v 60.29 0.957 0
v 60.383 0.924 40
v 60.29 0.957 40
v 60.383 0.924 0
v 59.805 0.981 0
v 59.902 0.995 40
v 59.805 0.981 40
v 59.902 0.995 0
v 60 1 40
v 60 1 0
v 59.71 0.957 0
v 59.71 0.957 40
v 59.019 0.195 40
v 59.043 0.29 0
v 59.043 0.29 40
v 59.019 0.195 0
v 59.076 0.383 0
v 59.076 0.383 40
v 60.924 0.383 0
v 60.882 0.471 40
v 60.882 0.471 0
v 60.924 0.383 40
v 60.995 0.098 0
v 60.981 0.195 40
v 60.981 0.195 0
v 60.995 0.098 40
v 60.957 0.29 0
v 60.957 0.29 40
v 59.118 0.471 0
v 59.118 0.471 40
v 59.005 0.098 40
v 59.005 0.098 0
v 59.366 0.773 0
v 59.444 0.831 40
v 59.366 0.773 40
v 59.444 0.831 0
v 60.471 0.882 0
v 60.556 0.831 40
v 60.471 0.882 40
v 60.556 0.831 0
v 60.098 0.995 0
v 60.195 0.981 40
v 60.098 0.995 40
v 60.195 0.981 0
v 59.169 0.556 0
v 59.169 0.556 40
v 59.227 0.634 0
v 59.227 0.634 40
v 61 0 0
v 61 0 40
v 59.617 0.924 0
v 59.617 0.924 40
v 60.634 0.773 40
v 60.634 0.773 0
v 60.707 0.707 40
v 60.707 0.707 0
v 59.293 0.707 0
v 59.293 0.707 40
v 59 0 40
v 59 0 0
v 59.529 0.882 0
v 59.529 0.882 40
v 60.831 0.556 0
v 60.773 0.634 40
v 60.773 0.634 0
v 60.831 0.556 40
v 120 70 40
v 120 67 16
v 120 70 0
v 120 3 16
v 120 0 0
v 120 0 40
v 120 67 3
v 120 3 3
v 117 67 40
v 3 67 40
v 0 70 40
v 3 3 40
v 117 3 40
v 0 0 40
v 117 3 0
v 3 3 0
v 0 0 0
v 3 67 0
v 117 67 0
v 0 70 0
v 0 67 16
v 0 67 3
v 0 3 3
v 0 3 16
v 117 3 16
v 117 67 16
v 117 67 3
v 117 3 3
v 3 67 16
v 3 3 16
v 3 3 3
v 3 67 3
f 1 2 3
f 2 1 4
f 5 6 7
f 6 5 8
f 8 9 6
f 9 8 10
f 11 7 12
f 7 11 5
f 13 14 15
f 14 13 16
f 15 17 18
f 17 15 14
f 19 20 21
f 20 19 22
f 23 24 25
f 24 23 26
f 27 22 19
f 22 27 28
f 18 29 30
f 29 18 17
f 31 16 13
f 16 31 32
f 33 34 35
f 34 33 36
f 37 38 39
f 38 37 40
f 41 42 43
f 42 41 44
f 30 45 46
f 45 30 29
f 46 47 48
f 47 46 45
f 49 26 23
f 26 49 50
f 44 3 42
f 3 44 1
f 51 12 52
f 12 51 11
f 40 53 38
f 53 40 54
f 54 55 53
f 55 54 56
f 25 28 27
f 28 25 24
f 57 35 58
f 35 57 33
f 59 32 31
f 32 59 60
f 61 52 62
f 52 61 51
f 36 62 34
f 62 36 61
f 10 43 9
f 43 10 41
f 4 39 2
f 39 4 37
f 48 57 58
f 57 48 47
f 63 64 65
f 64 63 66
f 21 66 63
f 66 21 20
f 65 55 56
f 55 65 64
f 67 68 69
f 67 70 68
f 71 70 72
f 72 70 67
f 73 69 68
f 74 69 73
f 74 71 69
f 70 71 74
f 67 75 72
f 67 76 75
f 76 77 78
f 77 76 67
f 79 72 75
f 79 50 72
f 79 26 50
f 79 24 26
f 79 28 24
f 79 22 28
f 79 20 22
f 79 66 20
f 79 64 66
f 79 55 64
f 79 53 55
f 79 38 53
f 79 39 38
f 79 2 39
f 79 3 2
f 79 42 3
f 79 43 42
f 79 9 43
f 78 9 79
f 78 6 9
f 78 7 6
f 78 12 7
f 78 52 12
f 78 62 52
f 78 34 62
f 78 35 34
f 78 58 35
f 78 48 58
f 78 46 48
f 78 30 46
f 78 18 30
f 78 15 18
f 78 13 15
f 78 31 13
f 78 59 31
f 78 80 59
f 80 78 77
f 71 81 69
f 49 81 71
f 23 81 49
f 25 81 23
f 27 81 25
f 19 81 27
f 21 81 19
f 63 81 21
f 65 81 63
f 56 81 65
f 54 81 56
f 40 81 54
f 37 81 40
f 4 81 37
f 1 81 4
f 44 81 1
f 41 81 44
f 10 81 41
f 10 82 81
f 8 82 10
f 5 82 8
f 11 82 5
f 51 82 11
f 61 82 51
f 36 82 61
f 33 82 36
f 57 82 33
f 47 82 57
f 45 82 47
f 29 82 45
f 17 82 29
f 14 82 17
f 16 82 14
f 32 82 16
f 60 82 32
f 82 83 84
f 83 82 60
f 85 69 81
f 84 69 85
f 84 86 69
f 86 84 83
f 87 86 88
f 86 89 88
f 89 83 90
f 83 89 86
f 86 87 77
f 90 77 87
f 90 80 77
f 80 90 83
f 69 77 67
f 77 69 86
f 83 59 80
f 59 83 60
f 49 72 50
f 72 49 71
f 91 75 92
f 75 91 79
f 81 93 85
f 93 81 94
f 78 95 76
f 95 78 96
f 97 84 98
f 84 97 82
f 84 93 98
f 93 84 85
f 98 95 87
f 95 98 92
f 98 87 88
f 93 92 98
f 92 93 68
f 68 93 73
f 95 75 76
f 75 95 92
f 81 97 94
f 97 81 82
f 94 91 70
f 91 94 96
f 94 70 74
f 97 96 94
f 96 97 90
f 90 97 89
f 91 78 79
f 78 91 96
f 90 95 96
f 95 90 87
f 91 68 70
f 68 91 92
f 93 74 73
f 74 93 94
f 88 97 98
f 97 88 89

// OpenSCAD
// Buffer tank for a mini horizontal gel-electrophoresis box. Open-top rectangular tank with a
// solid raised platform in the middle that divides the bottom into two buffer chambers. Each end
// wall has a horizontal 2 mm hole along X for electrode wires. NOVEL general part.
//

Lx = 120;
Wy = 70;
H  = 40;
w  = 3;
fl = 3;

$fn = 64;

ilx = Lx - 2 * w;
iy  = Wy - 2 * w;
ih  = H - fl;

difference() {
    cube([Lx, Wy, H]);
    translate([w, w, fl]) cube([ilx, iy, H - fl]);     // inner cavity
    translate([w, w, 0]) cube([ilx, iy, fl]);         // floor
    translate([0, w, fl]) cube([Lx, iy, 13]);         // raised platform (spans width, 60 mm long, top at z = fl + 10)
    for (x = [-Lx / 2, Lx / 2])
        translate([x, 0, -1]) rotate([0, 0, 90]) cylinder(h = Wy + 2, d = 2);                    // electrode holes through the end walls
}
